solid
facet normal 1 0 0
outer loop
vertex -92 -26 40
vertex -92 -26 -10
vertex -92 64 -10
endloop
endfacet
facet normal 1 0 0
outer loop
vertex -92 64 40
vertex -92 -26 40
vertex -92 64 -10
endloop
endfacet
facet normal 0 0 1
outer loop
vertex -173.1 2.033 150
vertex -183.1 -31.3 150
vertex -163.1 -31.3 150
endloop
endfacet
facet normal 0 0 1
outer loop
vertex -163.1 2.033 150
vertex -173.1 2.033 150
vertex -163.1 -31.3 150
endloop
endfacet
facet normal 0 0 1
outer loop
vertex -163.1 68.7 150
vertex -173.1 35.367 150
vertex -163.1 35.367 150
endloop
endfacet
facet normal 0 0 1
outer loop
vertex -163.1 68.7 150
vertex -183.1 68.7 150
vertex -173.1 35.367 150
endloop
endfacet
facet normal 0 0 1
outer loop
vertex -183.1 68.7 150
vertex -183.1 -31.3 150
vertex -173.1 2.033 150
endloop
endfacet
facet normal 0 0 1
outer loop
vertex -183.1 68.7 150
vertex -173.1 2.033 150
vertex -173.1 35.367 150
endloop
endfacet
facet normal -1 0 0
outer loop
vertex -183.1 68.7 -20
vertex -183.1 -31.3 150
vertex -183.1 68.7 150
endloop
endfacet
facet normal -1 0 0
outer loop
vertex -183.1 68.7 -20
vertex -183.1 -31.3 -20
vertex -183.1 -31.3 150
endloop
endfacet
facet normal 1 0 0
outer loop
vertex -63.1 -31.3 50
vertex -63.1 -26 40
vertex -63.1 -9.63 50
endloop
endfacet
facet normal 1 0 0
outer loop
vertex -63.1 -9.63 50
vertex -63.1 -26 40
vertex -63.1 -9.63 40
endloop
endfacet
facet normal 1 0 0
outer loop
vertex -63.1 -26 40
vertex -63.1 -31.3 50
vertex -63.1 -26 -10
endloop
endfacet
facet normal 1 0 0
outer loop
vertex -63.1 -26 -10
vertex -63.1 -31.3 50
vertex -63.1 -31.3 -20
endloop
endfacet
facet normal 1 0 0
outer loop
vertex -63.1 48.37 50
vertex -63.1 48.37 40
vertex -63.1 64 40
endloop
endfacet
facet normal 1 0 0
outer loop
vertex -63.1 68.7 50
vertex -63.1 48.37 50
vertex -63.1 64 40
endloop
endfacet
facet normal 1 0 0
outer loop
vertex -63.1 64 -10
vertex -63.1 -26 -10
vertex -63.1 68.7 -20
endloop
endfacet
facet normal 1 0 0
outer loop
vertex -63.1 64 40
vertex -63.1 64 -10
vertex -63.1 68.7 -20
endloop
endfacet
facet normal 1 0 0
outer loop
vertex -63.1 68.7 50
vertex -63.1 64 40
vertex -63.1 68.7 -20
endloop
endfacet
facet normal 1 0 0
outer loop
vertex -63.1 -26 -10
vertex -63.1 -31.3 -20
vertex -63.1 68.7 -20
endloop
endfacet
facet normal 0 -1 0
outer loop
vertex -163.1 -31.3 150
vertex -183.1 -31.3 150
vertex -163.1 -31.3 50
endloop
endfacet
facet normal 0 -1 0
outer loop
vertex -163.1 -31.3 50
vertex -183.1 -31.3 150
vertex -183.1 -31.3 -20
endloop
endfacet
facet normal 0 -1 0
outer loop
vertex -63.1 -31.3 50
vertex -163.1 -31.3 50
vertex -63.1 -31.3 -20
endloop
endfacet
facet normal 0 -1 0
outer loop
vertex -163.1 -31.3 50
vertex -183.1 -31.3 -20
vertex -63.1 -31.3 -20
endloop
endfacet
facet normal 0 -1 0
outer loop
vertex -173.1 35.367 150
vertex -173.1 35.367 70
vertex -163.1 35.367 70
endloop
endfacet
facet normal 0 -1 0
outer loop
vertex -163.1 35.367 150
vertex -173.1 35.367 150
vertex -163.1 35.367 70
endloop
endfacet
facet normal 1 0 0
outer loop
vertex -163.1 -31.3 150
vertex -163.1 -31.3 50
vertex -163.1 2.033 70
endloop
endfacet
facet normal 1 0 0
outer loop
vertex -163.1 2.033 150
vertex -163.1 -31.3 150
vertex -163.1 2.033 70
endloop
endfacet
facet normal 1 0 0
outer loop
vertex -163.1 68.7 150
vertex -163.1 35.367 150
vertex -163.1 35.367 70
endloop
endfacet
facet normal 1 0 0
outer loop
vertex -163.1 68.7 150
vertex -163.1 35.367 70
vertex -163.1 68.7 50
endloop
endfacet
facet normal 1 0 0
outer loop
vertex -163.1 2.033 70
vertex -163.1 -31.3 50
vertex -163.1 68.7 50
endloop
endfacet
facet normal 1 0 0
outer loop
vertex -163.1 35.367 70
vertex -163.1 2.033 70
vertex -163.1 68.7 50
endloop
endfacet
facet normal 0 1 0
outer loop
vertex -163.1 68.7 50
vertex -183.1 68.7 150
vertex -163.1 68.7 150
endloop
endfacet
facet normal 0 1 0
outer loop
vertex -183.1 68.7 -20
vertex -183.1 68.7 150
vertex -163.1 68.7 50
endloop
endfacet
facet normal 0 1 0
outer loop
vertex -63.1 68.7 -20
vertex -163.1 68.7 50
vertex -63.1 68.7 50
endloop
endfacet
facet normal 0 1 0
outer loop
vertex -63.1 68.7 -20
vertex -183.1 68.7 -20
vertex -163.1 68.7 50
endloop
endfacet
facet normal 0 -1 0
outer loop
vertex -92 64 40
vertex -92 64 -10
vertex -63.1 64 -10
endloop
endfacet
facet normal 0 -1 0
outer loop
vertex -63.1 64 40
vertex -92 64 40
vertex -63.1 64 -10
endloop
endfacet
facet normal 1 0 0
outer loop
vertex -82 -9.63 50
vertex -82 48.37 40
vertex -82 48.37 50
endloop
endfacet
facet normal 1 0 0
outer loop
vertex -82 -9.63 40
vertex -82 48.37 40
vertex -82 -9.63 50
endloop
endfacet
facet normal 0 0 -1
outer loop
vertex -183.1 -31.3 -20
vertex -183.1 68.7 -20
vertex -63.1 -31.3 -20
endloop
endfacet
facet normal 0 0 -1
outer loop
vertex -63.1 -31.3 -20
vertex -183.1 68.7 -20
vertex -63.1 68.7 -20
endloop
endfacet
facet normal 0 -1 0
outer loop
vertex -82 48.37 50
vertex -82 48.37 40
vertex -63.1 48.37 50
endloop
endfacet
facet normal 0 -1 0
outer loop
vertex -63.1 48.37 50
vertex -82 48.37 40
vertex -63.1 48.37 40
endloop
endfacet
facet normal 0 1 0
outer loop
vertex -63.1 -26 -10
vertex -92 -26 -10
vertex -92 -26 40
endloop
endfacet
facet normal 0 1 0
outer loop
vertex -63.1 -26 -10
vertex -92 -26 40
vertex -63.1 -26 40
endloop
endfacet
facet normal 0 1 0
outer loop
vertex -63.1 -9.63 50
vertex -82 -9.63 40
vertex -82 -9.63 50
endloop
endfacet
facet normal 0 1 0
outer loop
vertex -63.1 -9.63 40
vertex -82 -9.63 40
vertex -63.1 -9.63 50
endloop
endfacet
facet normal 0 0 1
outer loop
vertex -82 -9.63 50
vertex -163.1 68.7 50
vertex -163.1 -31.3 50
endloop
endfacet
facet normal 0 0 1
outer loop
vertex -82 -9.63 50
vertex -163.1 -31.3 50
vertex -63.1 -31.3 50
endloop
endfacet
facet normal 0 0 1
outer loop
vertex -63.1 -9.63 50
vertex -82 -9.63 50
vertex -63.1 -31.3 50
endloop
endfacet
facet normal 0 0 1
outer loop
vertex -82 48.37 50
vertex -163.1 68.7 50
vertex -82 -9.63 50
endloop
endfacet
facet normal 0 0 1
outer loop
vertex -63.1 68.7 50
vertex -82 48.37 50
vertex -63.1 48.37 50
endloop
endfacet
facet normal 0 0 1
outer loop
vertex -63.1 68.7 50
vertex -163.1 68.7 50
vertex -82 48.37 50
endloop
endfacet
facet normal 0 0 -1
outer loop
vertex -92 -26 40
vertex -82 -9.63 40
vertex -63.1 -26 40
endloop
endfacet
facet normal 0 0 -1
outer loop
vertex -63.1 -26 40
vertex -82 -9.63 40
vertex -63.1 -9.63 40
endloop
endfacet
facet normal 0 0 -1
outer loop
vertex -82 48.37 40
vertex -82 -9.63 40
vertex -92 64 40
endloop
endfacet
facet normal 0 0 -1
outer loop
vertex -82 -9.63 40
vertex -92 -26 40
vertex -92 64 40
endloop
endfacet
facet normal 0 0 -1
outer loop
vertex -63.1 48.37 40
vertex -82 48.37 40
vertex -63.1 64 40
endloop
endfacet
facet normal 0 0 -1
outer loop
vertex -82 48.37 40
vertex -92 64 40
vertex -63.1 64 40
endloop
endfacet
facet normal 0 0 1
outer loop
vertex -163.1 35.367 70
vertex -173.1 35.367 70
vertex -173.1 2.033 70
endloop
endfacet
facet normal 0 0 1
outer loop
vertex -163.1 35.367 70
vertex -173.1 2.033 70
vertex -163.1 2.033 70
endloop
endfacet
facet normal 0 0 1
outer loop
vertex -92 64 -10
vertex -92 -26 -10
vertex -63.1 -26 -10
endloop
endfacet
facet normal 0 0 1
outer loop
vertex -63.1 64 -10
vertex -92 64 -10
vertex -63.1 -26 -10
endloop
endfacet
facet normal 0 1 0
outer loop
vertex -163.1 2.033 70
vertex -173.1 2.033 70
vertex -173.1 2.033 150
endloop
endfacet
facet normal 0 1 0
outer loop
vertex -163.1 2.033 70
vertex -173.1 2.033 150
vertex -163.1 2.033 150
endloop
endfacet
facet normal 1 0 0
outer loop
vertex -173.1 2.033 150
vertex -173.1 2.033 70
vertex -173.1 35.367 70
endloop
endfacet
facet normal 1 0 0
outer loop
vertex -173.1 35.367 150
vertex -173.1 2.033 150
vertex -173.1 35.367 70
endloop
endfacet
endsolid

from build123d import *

# Parameters (mm, degrees)
SKETCH021_W       = 18.9
SKETCH021_H       = 58
EXTRUDE021_DEPTH  = 10
SKETCH020_W       = 90
SKETCH020_H       = 50
EXTRUDE020_DEPTH  = 200
CYLINDER_R        = 2.5
CYLINDER_DEPTH    = 70
CYLINDER002_R     = 2.5
CYLINDER002_DEPTH = 70
BOX001_W          = 82
BOX001_H          = 58
BOX001_DEPTH      = 44.4
BOX011_W          = 5
BOX011_H          = 5
BOX011_DEPTH      = 44.4
SKETCH001_R       = 5
EXTRUDE001_DEPTH  = 4
EXTRUDE002_DEPTH  = 15
SKETCH010_R       = 12.3
EXTRUDE010_DEPTH  = 5
BOX_W             = 75.7
BOX_H             = 45
BOX_DEPTH         = 44.4
BOX008_W          = 68.15
BOX008_H          = 15
BOX008_DEPTH      = 50
BOX009_W          = 68.15
BOX009_H          = 15
BOX009_DEPTH      = 50
BOX012_W          = 30
BOX012_H          = 100
BOX012_DEPTH      = 70
EXTRUDE003_DEPTH  = 25
BOX010_W          = 40
BOX010_H          = 120
BOX010_DEPTH      = 60
TUBE_R            = 45
TUBE_R_2          = 19.07
TUBE_DEPTH        = 50
BOX002_W          = 175
BOX002_H          = 90
BOX002_DEPTH      = 50
SKETCH016_W       = 10
SKETCH016_H       = 33.333334
EXTRUDE016_DEPTH  = 80
SKETCH_W          = 20
SKETCH_H          = 100
EXTRUDE_DEPTH     = 100
BOX017_W          = 120
BOX017_H          = 100
BOX017_DEPTH      = 70


with BuildPart() as extrude021:
    # Sketch021 (on Face14 of Cut017) → Extrude021 (new body)
    with BuildSketch(Plane(origin=(0, 0, 44.4), x_dir=(1, 0, 0), z_dir=(0, 0, -1))):
        with Locations((-72.55, -19.37)):
            Rectangle(SKETCH021_W, SKETCH021_H)
    extrude(amount=-EXTRUDE021_DEPTH)


with BuildPart() as extrude020:
    # Sketch020 (on Face26 of Cut016) → Extrude020 (new body)
    with BuildSketch(Plane.YZ.offset(-92)):
        with Locations((19, 15)):
            Rectangle(SKETCH020_W, SKETCH020_H)
    extrude(amount=EXTRUDE020_DEPTH)


with BuildPart() as throughholecylinder2:
    # Cylinder → Cylinder (new body)
    with BuildSketch(Plane(origin=(-86, -18, -20), x_dir=(1, 0, 0), z_dir=(0, 0, 1))):
        Circle(CYLINDER_R)
    extrude(amount=CYLINDER_DEPTH)


with BuildPart() as throughholecylinder1:
    # Cylinder002 → Cylinder002 (new body)
    with BuildSketch(Plane(origin=(-86, 56, -20), x_dir=(1, 0, 0), z_dir=(0, 0, 1))):
        Circle(CYLINDER002_R)
    extrude(amount=CYLINDER002_DEPTH)


with BuildPart() as motorhead:
    # Box001 → Box001 (new body)
    with BuildSketch(Plane(origin=(-82, -9.63, 0), x_dir=(1, 0, 0), z_dir=(0, 0, 1))):
        with Locations((41, 29)):
            Rectangle(BOX001_W, BOX001_H)
    extrude(amount=BOX001_DEPTH)


with BuildPart() as nubchannel:
    # Box011 → Box011 (new body)
    with BuildSketch(Plane(origin=(75.7, 16.87, 0), x_dir=(1, 0, 0), z_dir=(0, 0, 1))):
        with Locations((2.5, 2.5)):
            Rectangle(BOX011_W, BOX011_H)
    extrude(amount=BOX011_DEPTH)


with BuildPart() as motorshaftfull:
    # Sketch001 (on Face3 of Extrude010) → Extrude001 (new body)
    with BuildSketch(Plane.XY.offset(49.4)):
        with Locations((-58.7, 20.37)):
            Circle(SKETCH001_R)
    extrude(amount=EXTRUDE001_DEPTH)


with BuildPart() as motorshaftd:
    # Sketch002 (on Face3 of Extrude001) → Extrude002 (new body)
    with BuildSketch(Plane.XY.offset(53.4)):
        with BuildLine():
            Line((-62.7, 23.37), (-62.7, 17.37))
            ThreePointArc((-62.7, 17.37), (-53.7, 20.37), (-62.7, 23.37))
        make_face()
    extrude(amount=EXTRUDE002_DEPTH)


with BuildPart() as motorshaftassembly:
    # Sketch010 (on Face6 of Box001) → Extrude010 (new body)
    with BuildSketch(Plane(origin=(-82, -9.63, 44.4), x_dir=(1, 0, 0), z_dir=(0, 0, 1))):
        with Locations((23.3, 30)):
            Circle(SKETCH010_R)
    extrude(amount=EXTRUDE010_DEPTH)

    # Fusion002: union MotorShaftFull, MotorShaftD
    add(motorshaftfull.part)
    add(motorshaftd.part)


with BuildPart() as motor:
    # Box → Box (new body)
    with BuildSketch(Plane(origin=(0, -3.13, 0), x_dir=(1, 0, 0), z_dir=(0, 0, 1))):
        with Locations((37.85, 22.5)):
            Rectangle(BOX_W, BOX_H)
    extrude(amount=BOX_DEPTH)

    # Fusion005: union MotorHead, NubChannel, MotorShaftAssembly
    add(motorhead.part)
    add(nubchannel.part)
    add(motorshaftassembly.part)


with BuildPart() as cube008:
    # Box008 → Box008 (new body)
    with BuildSketch(Plane(origin=(41, -26, -10), x_dir=(1, 0, 0), z_dir=(0, 0, 1))):
        with Locations((34.075, 7.5)):
            Rectangle(BOX008_W, BOX008_H)
    extrude(amount=BOX008_DEPTH)


with BuildPart() as cube009:
    # Box009 → Box009 (new body)
    with BuildSketch(Plane(origin=(41, 49, -10), x_dir=(1, 0, 0), z_dir=(0, 0, 1))):
        with Locations((34.075, 7.5)):
            Rectangle(BOX009_W, BOX009_H)
    extrude(amount=BOX009_DEPTH)


with BuildPart() as steeringshaftcutter:
    # Box012 → Box012 (new body)
    with BuildSketch(Plane(origin=(136, -31, -14), x_dir=(1, 0, 0), z_dir=(0, 0, 1))):
        with Locations((15, 50)):
            Rectangle(BOX012_W, BOX012_H)
    extrude(amount=BOX012_DEPTH)


with BuildPart() as fingers:
    # Sketch004 (on Face2 of Tube) → Extrude003 (new body)
    with BuildSketch(Plane(origin=(120.15, 19, 40), x_dir=(1, 0, 0), z_dir=(0, 0, 1))):
        with BuildLine():
            Line((16.519435, -9.5375), (20.849562, -12.0375))
            ThreePointArc((12.0375, -20.849562), (17.023596, -17.023596), (20.849562, -12.0375))
            Line((12.0375, -20.849562), (9.5375, -16.519435))
            ThreePointArc((9.5375, -16.519435), (13.488062, -13.488062), (16.519435, -9.5375))
        make_face()
        with BuildLine():
            Line((0, -24.075), (0, -19.07))
            ThreePointArc((-9.535, -16.515104), (-4.935679, -18.420206), (0, -19.07))
            Line((-9.535, -16.515104), (-12.0375, -20.849562))
            ThreePointArc((-12.0375, -20.849562), (-6.231069, -23.254664), (0, -24.075))
        make_face()
        with BuildLine():
            Line((-20.849562, -12.0375), (-16.515104, -9.535))
            ThreePointArc((-19.07, 0), (-18.420206, -4.935679), (-16.515104, -9.535))
            Line((-19.07, 0), (-24.075, 0))
            ThreePointArc((-24.075, 0), (-23.254664, -6.231069), (-20.849562, -12.0375))
        make_face()
        with BuildLine():
            Line((-16.519435, 9.5375), (-20.849562, 12.0375))
            ThreePointArc((-12.0375, 20.849562), (-17.023596, 17.023596), (-20.849562, 12.0375))
            Line((-12.0375, 20.849562), (-9.5375, 16.519435))
            ThreePointArc((-9.5375, 16.519435), (-13.488062, 13.488062), (-16.519435, 9.5375))
        make_face()
        with BuildLine():
            Line((0, 24.075), (0, 19.075))
            ThreePointArc((9.5375, 16.519435), (4.936973, 18.425035), (0, 19.075))
            Line((9.5375, 16.519435), (12.0375, 20.849562))
            ThreePointArc((12.0375, 20.849562), (6.231069, 23.254664), (0, 24.075))
        make_face()
        with BuildLine():
            Line((16.515104, 9.535), (20.849562, 12.0375))
            ThreePointArc((24.075, 0), (23.254664, 6.231069), (20.849562, 12.0375))
            Line((19.07, 0), (24.075, 0))
            ThreePointArc((19.07, 0), (18.420206, 4.935679), (16.515104, 9.535))
        make_face()
    extrude(amount=EXTRUDE003_DEPTH)


with BuildPart() as fingers_1:
    # Extrude003 placement: moved
    add(fingers.part.moved(Location((0, 0, -5))))


with BuildPart() as roundoff:
    # Box010 → Box010 (new body)
    with BuildSketch(Plane(origin=(55, -34, -17), x_dir=(1, 0, 0), z_dir=(0, 0, 1))):
        with Locations((20, 60)):
            Rectangle(BOX010_W, BOX010_H)
    extrude(amount=BOX010_DEPTH)


with BuildPart() as steeringshaftcutdown:
    # Tube → Tube (new body)
    with BuildSketch(Plane(origin=(120.15, 19, -10), x_dir=(1, 0, 0), z_dir=(0, 0, 1))):
        Circle(TUBE_R)
        Circle(TUBE_R_2, mode=Mode.SUBTRACT)
    extrude(amount=TUBE_DEPTH)

    # Cut005: cut RoundOff
    add(roundoff.part, mode=Mode.SUBTRACT)

    # Fusion004: union Fingers
    add(fingers_1.part)


with BuildPart() as steeringshaftcutdown_1:
    # Fusion004 placement: moved
    add(steeringshaftcutdown.part.moved(Location((-12, 0, 0))))

    # Cut006: cut SteeringShaftCutter
    add(steeringshaftcutter.part, mode=Mode.SUBTRACT)


with BuildPart() as motormount:
    # Box002 → Box002 (new body)
    with BuildSketch(Plane(origin=(-92, -26, -10), x_dir=(1, 0, 0), z_dir=(0, 0, 1))):
        with Locations((87.5, 45)):
            Rectangle(BOX002_W, BOX002_H)
    extrude(amount=BOX002_DEPTH)

    # Fusion: union Motor, Cube008, Cube009, SteeringShaftCutDown
    add(motor.part)
    add(cube008.part)
    add(cube009.part)
    add(steeringshaftcutdown_1.part)

    # Cut: cut ThroughHoleCylinder1
    add(throughholecylinder1.part, mode=Mode.SUBTRACT)

    # Cut013: cut ThroughHoleCylinder2
    add(throughholecylinder2.part, mode=Mode.SUBTRACT)


with BuildPart() as extrude016:
    # Sketch016 (on Face6 of Extrude) → Extrude016 (new body)
    with BuildSketch(Plane.XY.offset(150)):
        with Locations((-168.1, 18.7)):
            Rectangle(SKETCH016_W, SKETCH016_H)
    extrude(amount=-EXTRUDE016_DEPTH)


with BuildPart() as cut015:
    # Sketch (on Face6 of Box017) → Extrude (new body)
    with BuildSketch(Plane(origin=(-183.1, -31.3, 50), x_dir=(1, 0, 0), z_dir=(0, 0, 1))):
        with Locations((10, 50)):
            Rectangle(SKETCH_W, SKETCH_H)
    extrude(amount=EXTRUDE_DEPTH)

    # Cut015: cut Extrude016
    add(extrude016.part, mode=Mode.SUBTRACT)


with BuildPart() as cut018:
    # Box017 → Box017 (new body)
    with BuildSketch(Plane(origin=(-183.1, -31.3, -20), x_dir=(1, 0, 0), z_dir=(0, 0, 1))):
        with Locations((60, 50)):
            Rectangle(BOX017_W, BOX017_H)
    extrude(amount=BOX017_DEPTH)

    # Fusion013: union Cut015
    add(cut015.part)

    # Cut016: cut MotorMount
    add(motormount.part, mode=Mode.SUBTRACT)

    # Cut017: cut Extrude020
    add(extrude020.part, mode=Mode.SUBTRACT)

    # Cut018: cut Extrude021
    add(extrude021.part, mode=Mode.SUBTRACT)


solid = cut018.part
